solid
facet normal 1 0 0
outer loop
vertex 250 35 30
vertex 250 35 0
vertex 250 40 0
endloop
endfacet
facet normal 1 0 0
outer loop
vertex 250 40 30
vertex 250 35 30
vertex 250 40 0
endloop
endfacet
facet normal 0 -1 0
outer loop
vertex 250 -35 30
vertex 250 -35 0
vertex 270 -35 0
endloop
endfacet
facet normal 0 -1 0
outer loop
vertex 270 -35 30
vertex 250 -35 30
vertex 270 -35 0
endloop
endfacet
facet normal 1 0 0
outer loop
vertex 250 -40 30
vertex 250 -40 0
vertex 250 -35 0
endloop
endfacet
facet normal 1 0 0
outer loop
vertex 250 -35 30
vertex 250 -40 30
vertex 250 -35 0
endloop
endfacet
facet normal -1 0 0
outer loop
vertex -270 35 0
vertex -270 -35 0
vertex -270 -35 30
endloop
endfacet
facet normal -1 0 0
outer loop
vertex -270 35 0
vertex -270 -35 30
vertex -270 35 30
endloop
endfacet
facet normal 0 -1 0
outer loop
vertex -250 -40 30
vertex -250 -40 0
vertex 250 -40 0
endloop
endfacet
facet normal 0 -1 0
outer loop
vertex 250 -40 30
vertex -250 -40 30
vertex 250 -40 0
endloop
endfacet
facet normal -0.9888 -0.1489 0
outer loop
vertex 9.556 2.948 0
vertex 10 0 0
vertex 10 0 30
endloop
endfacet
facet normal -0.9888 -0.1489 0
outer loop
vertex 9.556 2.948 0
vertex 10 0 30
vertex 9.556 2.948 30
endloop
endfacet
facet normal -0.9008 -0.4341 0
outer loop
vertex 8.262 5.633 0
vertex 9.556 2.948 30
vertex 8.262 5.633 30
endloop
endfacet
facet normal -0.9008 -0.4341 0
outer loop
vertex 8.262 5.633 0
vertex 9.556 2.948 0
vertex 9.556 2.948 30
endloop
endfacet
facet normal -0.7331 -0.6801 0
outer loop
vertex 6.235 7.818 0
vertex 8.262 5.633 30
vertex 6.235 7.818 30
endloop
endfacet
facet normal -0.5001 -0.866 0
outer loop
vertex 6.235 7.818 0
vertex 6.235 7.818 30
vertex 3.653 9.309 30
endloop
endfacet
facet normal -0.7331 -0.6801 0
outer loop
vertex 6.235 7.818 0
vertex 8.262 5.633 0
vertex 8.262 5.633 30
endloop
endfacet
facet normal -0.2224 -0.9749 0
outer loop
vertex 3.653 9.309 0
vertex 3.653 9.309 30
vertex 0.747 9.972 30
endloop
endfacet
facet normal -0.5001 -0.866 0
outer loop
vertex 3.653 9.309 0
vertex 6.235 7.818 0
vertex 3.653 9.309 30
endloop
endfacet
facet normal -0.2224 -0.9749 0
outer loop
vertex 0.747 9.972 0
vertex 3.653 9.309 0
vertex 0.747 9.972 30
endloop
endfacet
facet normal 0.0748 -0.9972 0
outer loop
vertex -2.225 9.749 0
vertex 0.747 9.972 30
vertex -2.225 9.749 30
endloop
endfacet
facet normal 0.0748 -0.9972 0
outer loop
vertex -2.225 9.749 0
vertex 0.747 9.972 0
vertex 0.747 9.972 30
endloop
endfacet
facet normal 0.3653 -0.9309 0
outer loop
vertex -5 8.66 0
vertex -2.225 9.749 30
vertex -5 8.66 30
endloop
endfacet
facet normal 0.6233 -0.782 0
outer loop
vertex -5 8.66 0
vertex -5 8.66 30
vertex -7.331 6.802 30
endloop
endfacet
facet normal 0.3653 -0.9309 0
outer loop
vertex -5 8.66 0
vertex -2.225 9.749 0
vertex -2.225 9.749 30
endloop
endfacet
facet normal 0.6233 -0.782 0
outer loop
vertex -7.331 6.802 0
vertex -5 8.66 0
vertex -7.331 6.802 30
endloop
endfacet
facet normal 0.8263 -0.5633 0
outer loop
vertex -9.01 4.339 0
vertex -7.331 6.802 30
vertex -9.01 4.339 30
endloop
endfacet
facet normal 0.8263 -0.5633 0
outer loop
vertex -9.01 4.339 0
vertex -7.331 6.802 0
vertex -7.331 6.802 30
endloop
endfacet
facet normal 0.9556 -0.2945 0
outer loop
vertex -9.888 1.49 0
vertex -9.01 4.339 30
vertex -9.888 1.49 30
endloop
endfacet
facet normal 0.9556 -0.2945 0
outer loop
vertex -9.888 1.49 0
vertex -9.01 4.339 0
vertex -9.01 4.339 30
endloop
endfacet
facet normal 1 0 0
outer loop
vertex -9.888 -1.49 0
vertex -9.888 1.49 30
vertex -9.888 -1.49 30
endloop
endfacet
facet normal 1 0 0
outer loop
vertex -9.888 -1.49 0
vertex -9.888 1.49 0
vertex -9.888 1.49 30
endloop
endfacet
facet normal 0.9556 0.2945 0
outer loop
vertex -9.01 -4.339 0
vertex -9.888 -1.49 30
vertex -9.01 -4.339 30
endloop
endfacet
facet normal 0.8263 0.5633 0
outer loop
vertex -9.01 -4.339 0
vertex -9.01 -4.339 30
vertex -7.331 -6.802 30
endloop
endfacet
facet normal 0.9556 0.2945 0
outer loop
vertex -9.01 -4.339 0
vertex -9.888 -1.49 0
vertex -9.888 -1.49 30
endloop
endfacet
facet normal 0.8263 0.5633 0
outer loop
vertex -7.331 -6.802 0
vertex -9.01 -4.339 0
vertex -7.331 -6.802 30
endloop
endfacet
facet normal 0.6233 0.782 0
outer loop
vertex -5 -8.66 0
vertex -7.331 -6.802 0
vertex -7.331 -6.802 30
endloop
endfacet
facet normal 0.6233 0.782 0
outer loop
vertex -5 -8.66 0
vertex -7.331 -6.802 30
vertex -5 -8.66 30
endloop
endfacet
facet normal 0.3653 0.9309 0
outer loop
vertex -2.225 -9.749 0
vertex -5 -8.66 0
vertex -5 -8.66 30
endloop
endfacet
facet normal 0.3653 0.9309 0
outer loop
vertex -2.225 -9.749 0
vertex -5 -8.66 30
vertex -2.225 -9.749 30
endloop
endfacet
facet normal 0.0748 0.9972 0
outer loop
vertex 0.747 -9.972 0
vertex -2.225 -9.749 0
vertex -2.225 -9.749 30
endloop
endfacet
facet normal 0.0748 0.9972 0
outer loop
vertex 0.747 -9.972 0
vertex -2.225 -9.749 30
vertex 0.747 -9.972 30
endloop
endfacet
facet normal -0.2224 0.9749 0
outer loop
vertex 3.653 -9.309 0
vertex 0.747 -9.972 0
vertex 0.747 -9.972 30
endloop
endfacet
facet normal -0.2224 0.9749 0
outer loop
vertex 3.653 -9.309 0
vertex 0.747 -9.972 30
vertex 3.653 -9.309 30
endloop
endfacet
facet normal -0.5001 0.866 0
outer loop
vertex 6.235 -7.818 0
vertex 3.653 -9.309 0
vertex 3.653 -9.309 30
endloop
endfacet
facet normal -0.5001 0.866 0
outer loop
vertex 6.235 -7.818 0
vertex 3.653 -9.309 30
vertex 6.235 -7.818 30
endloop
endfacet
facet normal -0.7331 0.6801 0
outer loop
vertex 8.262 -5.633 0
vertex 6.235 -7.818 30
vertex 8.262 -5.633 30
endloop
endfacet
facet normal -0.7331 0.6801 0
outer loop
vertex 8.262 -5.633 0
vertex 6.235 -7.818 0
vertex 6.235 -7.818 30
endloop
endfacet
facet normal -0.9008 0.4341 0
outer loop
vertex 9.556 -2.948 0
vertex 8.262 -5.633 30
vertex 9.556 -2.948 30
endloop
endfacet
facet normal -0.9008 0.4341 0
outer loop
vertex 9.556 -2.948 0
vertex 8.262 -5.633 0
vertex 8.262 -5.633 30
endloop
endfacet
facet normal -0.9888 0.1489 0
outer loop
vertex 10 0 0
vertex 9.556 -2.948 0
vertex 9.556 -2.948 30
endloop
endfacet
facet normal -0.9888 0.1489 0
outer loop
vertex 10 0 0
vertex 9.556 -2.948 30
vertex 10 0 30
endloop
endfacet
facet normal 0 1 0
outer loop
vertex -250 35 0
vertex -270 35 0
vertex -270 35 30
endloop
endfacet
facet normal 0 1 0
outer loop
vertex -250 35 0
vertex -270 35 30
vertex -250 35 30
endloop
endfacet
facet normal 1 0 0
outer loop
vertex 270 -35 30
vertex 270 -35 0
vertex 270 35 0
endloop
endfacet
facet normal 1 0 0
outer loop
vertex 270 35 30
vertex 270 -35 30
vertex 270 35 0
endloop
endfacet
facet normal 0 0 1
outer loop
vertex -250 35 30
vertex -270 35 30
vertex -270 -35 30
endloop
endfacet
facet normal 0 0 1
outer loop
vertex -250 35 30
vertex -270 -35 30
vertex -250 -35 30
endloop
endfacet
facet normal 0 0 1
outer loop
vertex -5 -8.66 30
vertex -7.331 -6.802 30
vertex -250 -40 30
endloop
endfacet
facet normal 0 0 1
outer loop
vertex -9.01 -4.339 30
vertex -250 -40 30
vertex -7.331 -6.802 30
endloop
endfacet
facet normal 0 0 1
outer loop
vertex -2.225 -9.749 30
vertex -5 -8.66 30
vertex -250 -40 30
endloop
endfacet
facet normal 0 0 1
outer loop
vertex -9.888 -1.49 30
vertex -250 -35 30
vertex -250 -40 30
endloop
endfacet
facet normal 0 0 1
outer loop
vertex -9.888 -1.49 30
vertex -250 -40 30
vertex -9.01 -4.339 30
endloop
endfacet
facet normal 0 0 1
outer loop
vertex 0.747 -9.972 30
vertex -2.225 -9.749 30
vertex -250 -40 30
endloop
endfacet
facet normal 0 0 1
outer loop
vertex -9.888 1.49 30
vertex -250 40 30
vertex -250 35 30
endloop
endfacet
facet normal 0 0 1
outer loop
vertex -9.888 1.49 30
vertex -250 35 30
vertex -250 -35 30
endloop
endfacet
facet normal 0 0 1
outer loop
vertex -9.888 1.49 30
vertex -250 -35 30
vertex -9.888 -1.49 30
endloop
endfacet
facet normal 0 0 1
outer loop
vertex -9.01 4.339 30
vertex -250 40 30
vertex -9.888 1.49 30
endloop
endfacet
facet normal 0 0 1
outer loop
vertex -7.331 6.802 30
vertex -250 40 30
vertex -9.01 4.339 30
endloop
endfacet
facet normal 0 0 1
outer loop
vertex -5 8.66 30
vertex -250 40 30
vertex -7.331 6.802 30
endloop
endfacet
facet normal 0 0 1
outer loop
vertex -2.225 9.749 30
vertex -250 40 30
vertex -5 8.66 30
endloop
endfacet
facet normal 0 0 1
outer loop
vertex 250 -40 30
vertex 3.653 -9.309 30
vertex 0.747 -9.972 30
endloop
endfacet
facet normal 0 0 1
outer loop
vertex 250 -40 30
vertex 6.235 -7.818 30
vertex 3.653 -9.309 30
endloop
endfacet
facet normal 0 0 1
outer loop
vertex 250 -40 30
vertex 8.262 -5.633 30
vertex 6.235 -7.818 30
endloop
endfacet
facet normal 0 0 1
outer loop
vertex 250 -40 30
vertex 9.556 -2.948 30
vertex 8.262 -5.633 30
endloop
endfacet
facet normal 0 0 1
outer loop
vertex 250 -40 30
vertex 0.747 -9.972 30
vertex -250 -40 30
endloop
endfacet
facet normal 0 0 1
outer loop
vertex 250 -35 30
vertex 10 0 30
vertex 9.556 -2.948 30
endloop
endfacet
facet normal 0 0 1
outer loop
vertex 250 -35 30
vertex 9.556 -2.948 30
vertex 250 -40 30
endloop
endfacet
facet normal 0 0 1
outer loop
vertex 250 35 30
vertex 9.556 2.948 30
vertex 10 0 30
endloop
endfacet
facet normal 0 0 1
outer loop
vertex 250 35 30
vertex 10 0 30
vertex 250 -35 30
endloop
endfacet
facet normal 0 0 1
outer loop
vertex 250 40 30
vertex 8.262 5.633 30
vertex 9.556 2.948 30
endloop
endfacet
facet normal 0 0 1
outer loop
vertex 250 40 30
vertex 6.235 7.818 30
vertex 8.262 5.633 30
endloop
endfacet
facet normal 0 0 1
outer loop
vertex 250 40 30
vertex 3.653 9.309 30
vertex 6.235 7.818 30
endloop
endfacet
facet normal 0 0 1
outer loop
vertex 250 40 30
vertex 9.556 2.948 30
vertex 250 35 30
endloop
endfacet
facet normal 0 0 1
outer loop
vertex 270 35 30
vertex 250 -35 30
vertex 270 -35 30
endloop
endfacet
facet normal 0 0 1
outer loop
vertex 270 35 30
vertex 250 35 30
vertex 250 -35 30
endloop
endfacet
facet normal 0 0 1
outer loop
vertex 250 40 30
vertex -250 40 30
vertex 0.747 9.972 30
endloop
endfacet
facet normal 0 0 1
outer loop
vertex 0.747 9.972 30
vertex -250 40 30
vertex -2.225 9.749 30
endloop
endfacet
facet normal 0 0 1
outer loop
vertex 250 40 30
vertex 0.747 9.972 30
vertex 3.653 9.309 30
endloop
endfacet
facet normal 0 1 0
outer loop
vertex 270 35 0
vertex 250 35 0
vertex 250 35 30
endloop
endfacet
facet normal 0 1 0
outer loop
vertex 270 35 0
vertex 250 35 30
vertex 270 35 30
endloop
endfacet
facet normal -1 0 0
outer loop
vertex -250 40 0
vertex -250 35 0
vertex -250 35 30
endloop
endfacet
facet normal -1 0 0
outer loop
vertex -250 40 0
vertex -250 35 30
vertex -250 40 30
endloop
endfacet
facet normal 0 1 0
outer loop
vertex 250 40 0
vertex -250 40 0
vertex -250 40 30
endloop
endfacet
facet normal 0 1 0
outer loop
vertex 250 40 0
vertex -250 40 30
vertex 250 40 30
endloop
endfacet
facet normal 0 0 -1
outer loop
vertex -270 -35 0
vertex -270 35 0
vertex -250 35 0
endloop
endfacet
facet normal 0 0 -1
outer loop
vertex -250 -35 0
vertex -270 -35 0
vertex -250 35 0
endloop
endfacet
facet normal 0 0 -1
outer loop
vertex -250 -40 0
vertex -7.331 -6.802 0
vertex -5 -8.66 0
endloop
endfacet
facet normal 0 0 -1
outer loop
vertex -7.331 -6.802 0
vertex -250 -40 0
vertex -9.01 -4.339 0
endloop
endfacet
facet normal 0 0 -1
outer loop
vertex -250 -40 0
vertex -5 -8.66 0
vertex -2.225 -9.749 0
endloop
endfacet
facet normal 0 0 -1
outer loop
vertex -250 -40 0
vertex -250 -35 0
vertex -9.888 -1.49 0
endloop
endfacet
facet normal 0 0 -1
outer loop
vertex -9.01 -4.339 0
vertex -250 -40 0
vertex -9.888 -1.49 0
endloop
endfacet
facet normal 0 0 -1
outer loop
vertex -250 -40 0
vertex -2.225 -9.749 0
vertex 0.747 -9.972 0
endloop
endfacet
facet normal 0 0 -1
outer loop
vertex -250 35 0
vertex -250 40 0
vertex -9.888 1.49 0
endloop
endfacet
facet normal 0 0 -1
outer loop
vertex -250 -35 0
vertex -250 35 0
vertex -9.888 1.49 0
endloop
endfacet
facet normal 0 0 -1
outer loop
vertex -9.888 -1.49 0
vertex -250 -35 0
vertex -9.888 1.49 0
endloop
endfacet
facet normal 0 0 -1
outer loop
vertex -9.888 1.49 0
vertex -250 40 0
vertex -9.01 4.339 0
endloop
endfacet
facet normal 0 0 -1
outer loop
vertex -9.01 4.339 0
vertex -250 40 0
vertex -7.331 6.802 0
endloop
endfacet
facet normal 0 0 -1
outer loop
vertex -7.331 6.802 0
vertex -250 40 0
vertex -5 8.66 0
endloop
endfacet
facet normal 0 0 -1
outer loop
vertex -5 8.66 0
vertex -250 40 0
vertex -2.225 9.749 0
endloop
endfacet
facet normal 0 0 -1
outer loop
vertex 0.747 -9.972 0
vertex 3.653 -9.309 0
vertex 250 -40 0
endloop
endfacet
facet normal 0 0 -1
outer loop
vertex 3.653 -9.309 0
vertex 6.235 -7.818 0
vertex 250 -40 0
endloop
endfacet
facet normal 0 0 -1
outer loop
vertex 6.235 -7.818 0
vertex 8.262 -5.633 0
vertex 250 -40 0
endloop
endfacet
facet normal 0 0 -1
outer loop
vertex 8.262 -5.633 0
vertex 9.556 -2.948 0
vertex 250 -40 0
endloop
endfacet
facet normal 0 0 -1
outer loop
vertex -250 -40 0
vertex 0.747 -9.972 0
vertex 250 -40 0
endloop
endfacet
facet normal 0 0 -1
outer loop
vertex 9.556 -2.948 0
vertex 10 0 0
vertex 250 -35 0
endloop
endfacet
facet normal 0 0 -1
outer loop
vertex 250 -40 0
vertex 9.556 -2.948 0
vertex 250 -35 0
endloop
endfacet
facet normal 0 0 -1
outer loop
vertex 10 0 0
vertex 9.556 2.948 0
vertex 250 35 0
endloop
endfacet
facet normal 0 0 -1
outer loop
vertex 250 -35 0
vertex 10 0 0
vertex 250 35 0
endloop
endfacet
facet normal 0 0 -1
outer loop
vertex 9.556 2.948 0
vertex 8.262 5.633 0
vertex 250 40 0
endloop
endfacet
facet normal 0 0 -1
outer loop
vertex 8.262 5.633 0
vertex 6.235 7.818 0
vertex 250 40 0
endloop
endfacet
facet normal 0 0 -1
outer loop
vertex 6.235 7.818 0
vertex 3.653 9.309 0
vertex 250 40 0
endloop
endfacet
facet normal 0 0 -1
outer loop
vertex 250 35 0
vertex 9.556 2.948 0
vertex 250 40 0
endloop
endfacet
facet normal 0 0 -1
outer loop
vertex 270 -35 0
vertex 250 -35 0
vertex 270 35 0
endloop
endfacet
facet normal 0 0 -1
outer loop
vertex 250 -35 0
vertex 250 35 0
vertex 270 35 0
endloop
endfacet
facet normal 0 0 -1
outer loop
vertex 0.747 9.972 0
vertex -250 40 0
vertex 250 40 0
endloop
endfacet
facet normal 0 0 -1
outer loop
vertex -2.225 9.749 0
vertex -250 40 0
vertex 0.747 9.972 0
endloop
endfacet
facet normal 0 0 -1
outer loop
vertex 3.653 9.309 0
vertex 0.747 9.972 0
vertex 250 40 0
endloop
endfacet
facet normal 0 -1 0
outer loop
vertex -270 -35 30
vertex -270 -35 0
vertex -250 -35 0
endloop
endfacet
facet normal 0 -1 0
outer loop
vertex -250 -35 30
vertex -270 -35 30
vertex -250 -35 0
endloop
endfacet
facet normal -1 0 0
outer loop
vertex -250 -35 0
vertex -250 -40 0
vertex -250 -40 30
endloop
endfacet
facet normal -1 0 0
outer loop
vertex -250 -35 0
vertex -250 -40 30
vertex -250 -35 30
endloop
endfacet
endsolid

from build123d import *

# Parameters (mm, degrees)
SKETCH_1_W      = 500
SKETCH_1_H      = 80
SKETCH_1_R      = 10
SKETCH_1_W_2    = 20
SKETCH_1_H_2    = 70
EXTRUDE_1_DEPTH = 30


with BuildPart() as part:
    # 草图1 → 凸台-拉伸1 (new body)
    # profile 1 of 3: a face of its own
    with BuildSketch(Plane.XY):
        Rectangle(SKETCH_1_W, SKETCH_1_H)
        Circle(SKETCH_1_R, mode=Mode.SUBTRACT)
    # profile 2 of 3: a face of its own
    with BuildSketch(Plane.XY):
        with Locations((-260, 0)):
            Rectangle(SKETCH_1_W_2, SKETCH_1_H_2)
    # profile 3 of 3: a face of its own
    with BuildSketch(Plane.XY):
        with Locations((260, 0)):
            Rectangle(SKETCH_1_W_2, SKETCH_1_H_2)
    extrude(amount=EXTRUDE_1_DEPTH)


solid = part.part
